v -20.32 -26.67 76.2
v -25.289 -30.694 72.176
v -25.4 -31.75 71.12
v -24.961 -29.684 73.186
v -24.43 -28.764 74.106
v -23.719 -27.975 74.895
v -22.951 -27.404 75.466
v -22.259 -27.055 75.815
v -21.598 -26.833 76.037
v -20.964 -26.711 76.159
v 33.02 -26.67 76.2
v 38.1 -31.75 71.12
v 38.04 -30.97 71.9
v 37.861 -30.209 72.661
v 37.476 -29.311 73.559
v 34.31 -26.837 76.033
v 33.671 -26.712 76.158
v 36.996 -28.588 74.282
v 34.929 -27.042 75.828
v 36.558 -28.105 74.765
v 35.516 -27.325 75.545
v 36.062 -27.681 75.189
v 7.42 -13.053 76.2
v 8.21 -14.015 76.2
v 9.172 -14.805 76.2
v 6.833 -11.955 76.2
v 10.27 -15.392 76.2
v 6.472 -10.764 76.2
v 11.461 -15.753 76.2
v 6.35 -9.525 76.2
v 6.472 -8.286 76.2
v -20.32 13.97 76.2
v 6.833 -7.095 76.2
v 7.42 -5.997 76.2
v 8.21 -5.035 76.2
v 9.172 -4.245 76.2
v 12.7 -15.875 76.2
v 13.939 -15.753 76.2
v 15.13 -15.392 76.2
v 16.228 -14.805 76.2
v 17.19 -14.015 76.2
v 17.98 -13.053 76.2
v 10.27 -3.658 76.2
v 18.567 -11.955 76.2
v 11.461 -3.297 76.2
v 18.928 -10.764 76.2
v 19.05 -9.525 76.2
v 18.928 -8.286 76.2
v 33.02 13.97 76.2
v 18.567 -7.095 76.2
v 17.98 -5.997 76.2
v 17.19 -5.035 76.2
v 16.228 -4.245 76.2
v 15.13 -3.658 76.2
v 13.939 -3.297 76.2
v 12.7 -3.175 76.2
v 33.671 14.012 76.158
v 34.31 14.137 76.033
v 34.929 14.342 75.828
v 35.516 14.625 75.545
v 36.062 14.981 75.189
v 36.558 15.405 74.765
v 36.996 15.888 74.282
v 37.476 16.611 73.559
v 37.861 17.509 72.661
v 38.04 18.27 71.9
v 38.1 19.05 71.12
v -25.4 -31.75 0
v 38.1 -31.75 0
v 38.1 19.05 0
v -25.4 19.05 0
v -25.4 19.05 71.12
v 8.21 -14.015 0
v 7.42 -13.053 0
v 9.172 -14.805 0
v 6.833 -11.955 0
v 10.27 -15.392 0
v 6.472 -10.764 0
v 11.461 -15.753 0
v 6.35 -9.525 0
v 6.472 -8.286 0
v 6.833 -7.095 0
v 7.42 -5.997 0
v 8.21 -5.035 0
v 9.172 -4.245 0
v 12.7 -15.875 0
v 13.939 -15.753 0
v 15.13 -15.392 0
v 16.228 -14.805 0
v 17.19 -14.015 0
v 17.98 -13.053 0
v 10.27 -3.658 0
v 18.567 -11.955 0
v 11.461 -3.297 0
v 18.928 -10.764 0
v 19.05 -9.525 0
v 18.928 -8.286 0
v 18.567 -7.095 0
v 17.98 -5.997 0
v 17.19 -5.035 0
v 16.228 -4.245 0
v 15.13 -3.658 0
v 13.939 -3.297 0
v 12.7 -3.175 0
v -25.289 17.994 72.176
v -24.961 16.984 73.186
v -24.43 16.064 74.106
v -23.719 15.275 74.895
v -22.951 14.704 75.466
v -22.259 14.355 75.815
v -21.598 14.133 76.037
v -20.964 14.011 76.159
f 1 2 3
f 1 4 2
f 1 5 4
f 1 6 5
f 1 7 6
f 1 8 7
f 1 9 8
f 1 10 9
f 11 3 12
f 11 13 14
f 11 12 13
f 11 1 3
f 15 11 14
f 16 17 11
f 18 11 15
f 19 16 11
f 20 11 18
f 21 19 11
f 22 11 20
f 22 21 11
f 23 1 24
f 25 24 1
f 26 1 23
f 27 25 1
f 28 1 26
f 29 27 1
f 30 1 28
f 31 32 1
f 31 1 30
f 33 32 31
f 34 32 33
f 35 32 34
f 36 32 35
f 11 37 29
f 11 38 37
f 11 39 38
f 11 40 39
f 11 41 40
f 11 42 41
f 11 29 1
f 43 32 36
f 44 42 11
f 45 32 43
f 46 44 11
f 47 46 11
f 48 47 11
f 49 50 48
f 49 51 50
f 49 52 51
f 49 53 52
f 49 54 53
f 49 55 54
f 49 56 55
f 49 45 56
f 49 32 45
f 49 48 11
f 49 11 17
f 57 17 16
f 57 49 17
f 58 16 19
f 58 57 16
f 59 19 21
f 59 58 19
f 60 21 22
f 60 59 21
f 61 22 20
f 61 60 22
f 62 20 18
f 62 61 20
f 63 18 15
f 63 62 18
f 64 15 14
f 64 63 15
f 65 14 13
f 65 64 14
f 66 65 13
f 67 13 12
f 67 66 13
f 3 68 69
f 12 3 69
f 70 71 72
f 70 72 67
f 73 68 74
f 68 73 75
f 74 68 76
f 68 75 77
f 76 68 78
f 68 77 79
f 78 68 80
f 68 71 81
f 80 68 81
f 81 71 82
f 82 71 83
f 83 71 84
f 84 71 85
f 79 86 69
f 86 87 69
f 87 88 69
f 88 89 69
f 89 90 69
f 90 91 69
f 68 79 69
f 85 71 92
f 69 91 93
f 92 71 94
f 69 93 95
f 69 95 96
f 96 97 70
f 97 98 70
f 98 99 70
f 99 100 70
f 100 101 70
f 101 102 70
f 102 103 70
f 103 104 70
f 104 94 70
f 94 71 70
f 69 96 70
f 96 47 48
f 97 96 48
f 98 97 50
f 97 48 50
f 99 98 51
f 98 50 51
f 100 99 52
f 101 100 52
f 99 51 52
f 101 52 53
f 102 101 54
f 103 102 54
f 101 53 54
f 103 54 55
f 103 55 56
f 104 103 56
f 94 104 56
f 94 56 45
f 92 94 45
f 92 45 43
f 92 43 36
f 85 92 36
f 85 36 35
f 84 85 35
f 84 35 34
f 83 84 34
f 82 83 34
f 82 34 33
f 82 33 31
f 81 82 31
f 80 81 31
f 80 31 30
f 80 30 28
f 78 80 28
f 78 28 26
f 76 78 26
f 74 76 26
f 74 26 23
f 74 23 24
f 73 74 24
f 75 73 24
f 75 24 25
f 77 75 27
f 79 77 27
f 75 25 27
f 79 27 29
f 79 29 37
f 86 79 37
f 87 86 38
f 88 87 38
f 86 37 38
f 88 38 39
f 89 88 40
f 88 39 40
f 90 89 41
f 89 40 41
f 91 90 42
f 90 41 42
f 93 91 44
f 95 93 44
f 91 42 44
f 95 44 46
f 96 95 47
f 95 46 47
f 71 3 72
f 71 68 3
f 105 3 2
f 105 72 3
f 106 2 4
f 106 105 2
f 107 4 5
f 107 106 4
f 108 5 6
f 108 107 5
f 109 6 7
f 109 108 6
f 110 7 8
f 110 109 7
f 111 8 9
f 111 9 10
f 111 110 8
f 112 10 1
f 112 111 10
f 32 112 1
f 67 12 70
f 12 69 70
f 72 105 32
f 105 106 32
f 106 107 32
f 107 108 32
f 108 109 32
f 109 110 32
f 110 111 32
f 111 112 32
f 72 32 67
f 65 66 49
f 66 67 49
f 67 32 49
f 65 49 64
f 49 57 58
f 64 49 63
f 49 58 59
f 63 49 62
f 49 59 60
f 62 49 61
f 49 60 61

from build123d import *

# Parameters (mm, degrees)
F0_W     = 63.5
F0_H     = 50.8
F1_DEPTH = 76.2
F2_R     = 6.35
F3_DEPTH = 76.201
F4_SIZE  = 5.08
F5_R     = 5.08


with BuildPart() as f1:
    # F0 (on Top) → F1 (new body)
    with BuildSketch(Plane.XY):
        with Locations((6.35, -6.35)):
            Rectangle(F0_W, F0_H)
    extrude(amount=F1_DEPTH)

    # F2 (on face) → F3 (cut, through all)
    with BuildSketch(Plane.XY.offset(76.2)):
        with Locations((12.7, -9.525)):
            Circle(F2_R)
    extrude(amount=-F3_DEPTH, mode=Mode.SUBTRACT)

    # F4
    f4_edges = [f1.edges().sort_by_distance(p)[0] for p in [
        (6.35, 19.05, 76.2),
        (6.35, -31.75, 76.2),
    ]]
    chamfer(f4_edges, length=F4_SIZE)

    # F5
    f5_edges = [f1.edges().sort_by_distance(p)[0] for p in [
        (-25.4, -6.35, 76.2),
        (38.1, -6.35, 76.2),
    ]]
    fillet(f5_edges, radius=F5_R)


solid = f1.part
